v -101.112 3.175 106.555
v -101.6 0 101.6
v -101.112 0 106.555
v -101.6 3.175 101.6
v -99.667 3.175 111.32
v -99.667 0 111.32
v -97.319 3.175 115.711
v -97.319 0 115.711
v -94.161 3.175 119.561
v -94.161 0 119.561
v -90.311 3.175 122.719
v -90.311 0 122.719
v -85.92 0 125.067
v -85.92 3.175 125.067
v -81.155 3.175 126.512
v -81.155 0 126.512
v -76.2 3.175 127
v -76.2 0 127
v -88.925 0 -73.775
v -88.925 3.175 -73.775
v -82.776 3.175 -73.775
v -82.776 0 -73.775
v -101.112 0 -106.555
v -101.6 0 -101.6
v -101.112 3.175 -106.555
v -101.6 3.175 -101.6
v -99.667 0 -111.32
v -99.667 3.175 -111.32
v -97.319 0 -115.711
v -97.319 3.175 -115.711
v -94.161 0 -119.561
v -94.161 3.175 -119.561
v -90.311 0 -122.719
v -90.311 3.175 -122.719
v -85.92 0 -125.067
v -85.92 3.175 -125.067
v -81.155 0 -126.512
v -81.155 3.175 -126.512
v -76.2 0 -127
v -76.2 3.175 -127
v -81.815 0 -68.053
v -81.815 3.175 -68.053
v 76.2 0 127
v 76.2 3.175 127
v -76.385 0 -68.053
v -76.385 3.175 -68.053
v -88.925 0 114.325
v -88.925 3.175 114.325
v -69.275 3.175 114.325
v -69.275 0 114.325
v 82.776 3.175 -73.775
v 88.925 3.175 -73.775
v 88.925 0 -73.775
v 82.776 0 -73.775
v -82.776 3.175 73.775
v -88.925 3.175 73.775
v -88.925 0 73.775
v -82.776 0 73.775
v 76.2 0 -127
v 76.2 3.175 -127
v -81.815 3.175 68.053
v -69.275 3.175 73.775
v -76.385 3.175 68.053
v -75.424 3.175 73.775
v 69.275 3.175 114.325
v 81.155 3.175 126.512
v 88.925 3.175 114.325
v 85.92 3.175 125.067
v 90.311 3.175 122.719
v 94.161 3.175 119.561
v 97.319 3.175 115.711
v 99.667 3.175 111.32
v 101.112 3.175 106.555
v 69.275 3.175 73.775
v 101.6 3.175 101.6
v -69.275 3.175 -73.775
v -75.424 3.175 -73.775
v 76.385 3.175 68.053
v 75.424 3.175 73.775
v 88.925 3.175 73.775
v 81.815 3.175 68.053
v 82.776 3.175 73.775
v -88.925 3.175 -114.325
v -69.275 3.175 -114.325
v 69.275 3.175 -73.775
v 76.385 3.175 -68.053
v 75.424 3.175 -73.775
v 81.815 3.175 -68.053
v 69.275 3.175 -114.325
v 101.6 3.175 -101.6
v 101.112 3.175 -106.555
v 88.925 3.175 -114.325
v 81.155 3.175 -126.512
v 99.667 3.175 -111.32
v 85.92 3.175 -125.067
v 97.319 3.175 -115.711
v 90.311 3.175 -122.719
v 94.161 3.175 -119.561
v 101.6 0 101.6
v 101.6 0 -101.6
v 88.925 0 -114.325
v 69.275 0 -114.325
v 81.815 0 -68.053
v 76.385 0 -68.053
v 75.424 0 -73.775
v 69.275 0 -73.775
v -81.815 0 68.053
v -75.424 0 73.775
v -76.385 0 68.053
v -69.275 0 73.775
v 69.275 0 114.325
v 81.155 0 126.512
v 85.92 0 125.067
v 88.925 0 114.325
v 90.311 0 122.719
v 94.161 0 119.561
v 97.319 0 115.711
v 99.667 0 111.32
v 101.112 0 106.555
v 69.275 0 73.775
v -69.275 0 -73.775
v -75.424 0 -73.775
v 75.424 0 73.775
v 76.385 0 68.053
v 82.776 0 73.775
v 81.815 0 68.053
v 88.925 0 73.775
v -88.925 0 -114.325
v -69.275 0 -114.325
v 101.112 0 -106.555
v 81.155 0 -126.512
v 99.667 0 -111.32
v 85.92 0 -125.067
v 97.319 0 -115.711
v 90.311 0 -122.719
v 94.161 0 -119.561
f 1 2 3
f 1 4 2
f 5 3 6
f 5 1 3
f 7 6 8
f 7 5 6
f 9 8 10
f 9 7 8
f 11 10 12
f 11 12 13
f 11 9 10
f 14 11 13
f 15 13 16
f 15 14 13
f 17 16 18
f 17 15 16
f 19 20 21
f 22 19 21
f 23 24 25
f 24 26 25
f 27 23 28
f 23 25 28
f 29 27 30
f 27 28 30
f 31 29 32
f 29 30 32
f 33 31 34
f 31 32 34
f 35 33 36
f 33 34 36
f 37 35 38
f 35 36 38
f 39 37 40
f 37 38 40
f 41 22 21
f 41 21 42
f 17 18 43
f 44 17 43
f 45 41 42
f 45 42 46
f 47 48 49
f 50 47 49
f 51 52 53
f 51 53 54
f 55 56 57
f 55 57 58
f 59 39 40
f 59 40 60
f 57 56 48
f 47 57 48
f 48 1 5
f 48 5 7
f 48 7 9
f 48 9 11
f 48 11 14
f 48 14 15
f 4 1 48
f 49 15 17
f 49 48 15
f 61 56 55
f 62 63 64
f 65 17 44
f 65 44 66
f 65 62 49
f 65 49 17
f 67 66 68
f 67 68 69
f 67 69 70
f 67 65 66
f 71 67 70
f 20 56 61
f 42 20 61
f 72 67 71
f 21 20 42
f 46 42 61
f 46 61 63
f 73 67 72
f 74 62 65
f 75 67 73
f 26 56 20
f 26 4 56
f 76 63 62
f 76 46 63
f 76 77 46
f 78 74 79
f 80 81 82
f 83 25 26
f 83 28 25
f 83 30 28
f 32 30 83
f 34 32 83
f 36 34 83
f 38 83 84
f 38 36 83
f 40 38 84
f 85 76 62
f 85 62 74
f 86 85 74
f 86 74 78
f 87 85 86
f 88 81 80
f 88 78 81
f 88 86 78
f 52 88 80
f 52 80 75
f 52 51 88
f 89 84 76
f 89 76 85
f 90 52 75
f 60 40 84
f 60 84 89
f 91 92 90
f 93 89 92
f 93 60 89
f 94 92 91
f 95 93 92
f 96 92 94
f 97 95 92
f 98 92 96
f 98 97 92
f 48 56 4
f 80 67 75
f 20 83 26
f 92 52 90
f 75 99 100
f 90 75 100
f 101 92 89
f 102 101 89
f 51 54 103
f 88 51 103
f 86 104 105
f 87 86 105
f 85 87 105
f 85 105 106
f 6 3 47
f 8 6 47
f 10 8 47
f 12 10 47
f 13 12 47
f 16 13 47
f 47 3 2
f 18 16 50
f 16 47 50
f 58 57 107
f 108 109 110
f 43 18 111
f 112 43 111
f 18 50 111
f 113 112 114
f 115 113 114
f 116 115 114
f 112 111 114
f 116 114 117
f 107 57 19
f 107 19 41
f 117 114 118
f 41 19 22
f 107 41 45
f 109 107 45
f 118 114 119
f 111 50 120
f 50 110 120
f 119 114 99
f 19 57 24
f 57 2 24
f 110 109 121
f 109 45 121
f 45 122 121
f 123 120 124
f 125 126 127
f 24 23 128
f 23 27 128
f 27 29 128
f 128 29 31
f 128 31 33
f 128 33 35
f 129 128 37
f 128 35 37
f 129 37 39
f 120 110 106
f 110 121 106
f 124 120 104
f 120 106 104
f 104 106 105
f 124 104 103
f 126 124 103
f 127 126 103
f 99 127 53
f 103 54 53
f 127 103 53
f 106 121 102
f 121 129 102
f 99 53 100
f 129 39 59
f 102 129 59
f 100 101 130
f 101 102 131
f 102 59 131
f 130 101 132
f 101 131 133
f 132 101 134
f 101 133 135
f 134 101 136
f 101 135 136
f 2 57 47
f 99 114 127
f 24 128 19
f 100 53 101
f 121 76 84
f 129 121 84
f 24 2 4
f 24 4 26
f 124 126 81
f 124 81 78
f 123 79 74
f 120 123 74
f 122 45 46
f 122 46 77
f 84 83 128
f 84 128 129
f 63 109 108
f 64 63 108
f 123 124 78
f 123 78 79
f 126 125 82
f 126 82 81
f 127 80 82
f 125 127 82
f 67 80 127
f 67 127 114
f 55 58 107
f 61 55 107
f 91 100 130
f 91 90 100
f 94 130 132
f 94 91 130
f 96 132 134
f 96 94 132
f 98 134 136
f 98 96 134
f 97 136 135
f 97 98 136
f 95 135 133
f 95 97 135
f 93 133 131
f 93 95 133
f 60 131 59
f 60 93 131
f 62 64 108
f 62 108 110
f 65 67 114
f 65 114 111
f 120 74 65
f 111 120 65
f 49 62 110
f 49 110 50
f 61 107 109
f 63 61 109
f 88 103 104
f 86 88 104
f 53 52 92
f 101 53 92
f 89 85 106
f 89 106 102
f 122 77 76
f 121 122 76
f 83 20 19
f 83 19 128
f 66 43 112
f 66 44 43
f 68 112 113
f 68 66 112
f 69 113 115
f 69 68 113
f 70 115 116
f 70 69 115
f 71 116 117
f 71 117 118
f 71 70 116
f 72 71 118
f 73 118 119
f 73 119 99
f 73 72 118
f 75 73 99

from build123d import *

# Parameters (mm, degrees)
SKETCH1_W               = 203.2
SKETCH1_H               = 254
BOSS_EXTRUDE1_DEPTH     = 3.175
FILLET1_R               = 25.4
SKETCH2_W               = 19.6508
SKETCH2_H               = 40.550799923
CUT_EXTRUDE1_DEPTH      = 163.67034341
CUT_EXTRUDE2_DEPTH      = 163.67034341
MIRROR2_COPY_1_SKETCH_W = 19.6508
MIRROR2_COPY_1_SKETCH_H = 40.550799923
MIRROR2_COPY_1_DEPTH    = 163.67034341
MIRROR2_COPY_2_DEPTH    = 163.67034341


with BuildPart() as part:
    # Sketch1 → Boss-Extrude1 (new body)
    with BuildSketch(Plane(origin=(0, 0, 0), x_dir=(1, 0, 0), z_dir=(0, 1, 0))):
        Rectangle(SKETCH1_W, SKETCH1_H)
    extrude(amount=BOSS_EXTRUDE1_DEPTH)

    # Fillet1
    fillet1_edges = [part.edges().sort_by_distance(p)[0] for p in [
        (101.6, 1.5875, 127),
        (-101.6, 1.5875, 127),
        (-101.6, 1.5875, -127),
        (101.6, 1.5875, -127),
    ]]
    fillet(fillet1_edges, radius=FILLET1_R)

    # Sketch2 → Cut-Extrude1 (cut, through all)
    with BuildSketch(Plane(origin=(0, 3.175, 0), x_dir=(1, 0, 0), z_dir=(0, 1, 0))):
        with Locations((-79.1, 94.050000013)):
            Rectangle(SKETCH2_W, SKETCH2_H)
    cut_extrude1 = extrude(amount=-CUT_EXTRUDE1_DEPTH, mode=Mode.SUBTRACT)

    # Sketch3 → Cut-Extrude2 (cut, through all)
    with BuildSketch(Plane.XZ):
        Polygon((-82.775820479, -73.774600051), (-81.815035673, -68.053121226), (-76.384964327, -68.053121226), (-75.424179521, -73.774600051), align=None)
    cut_extrude2 = extrude(amount=-CUT_EXTRUDE2_DEPTH, mode=Mode.SUBTRACT)

    # Mirror1: Cut-Extrude1, Cut-Extrude2 across plane
    add(cut_extrude1.mirror(Plane(origin=(0, 0, 0), x_dir=(0, 0, 1), z_dir=(1, 0, 0))), mode=Mode.SUBTRACT)
    add(cut_extrude2.mirror(Plane(origin=(0, 0, 0), x_dir=(0, 0, 1), z_dir=(1, 0, 0))), mode=Mode.SUBTRACT)

    # Mirror2: Cut-Extrude1, Cut-Extrude2 across plane
    add(cut_extrude1.mirror(Plane.XY), mode=Mode.SUBTRACT)
    add(cut_extrude2.mirror(Plane.XY), mode=Mode.SUBTRACT)

    # Mirror2 copy 1 sketch → Mirror2 copy 1 (cut, through all)
    with BuildSketch(Plane(origin=(0, 3.175, 0), x_dir=(-1, 0, 0), z_dir=(0, 1, 0))):
        with Locations((-79.1, 94.050000013)):
            Rectangle(MIRROR2_COPY_1_SKETCH_W, MIRROR2_COPY_1_SKETCH_H)
    extrude(amount=-MIRROR2_COPY_1_DEPTH, mode=Mode.SUBTRACT)

    # Mirror2 copy 2 sketch → Mirror2 copy 2 (cut, through all)
    with BuildSketch(Plane(origin=(0, 0, 0), x_dir=(-1, 0, 0), z_dir=(0, -1, 0))):
        Polygon((-82.775820479, -73.774600051), (-81.815035673, -68.053121226), (-76.384964327, -68.053121226), (-75.424179521, -73.774600051), align=None)
    extrude(amount=-MIRROR2_COPY_2_DEPTH, mode=Mode.SUBTRACT)


solid = part.part
